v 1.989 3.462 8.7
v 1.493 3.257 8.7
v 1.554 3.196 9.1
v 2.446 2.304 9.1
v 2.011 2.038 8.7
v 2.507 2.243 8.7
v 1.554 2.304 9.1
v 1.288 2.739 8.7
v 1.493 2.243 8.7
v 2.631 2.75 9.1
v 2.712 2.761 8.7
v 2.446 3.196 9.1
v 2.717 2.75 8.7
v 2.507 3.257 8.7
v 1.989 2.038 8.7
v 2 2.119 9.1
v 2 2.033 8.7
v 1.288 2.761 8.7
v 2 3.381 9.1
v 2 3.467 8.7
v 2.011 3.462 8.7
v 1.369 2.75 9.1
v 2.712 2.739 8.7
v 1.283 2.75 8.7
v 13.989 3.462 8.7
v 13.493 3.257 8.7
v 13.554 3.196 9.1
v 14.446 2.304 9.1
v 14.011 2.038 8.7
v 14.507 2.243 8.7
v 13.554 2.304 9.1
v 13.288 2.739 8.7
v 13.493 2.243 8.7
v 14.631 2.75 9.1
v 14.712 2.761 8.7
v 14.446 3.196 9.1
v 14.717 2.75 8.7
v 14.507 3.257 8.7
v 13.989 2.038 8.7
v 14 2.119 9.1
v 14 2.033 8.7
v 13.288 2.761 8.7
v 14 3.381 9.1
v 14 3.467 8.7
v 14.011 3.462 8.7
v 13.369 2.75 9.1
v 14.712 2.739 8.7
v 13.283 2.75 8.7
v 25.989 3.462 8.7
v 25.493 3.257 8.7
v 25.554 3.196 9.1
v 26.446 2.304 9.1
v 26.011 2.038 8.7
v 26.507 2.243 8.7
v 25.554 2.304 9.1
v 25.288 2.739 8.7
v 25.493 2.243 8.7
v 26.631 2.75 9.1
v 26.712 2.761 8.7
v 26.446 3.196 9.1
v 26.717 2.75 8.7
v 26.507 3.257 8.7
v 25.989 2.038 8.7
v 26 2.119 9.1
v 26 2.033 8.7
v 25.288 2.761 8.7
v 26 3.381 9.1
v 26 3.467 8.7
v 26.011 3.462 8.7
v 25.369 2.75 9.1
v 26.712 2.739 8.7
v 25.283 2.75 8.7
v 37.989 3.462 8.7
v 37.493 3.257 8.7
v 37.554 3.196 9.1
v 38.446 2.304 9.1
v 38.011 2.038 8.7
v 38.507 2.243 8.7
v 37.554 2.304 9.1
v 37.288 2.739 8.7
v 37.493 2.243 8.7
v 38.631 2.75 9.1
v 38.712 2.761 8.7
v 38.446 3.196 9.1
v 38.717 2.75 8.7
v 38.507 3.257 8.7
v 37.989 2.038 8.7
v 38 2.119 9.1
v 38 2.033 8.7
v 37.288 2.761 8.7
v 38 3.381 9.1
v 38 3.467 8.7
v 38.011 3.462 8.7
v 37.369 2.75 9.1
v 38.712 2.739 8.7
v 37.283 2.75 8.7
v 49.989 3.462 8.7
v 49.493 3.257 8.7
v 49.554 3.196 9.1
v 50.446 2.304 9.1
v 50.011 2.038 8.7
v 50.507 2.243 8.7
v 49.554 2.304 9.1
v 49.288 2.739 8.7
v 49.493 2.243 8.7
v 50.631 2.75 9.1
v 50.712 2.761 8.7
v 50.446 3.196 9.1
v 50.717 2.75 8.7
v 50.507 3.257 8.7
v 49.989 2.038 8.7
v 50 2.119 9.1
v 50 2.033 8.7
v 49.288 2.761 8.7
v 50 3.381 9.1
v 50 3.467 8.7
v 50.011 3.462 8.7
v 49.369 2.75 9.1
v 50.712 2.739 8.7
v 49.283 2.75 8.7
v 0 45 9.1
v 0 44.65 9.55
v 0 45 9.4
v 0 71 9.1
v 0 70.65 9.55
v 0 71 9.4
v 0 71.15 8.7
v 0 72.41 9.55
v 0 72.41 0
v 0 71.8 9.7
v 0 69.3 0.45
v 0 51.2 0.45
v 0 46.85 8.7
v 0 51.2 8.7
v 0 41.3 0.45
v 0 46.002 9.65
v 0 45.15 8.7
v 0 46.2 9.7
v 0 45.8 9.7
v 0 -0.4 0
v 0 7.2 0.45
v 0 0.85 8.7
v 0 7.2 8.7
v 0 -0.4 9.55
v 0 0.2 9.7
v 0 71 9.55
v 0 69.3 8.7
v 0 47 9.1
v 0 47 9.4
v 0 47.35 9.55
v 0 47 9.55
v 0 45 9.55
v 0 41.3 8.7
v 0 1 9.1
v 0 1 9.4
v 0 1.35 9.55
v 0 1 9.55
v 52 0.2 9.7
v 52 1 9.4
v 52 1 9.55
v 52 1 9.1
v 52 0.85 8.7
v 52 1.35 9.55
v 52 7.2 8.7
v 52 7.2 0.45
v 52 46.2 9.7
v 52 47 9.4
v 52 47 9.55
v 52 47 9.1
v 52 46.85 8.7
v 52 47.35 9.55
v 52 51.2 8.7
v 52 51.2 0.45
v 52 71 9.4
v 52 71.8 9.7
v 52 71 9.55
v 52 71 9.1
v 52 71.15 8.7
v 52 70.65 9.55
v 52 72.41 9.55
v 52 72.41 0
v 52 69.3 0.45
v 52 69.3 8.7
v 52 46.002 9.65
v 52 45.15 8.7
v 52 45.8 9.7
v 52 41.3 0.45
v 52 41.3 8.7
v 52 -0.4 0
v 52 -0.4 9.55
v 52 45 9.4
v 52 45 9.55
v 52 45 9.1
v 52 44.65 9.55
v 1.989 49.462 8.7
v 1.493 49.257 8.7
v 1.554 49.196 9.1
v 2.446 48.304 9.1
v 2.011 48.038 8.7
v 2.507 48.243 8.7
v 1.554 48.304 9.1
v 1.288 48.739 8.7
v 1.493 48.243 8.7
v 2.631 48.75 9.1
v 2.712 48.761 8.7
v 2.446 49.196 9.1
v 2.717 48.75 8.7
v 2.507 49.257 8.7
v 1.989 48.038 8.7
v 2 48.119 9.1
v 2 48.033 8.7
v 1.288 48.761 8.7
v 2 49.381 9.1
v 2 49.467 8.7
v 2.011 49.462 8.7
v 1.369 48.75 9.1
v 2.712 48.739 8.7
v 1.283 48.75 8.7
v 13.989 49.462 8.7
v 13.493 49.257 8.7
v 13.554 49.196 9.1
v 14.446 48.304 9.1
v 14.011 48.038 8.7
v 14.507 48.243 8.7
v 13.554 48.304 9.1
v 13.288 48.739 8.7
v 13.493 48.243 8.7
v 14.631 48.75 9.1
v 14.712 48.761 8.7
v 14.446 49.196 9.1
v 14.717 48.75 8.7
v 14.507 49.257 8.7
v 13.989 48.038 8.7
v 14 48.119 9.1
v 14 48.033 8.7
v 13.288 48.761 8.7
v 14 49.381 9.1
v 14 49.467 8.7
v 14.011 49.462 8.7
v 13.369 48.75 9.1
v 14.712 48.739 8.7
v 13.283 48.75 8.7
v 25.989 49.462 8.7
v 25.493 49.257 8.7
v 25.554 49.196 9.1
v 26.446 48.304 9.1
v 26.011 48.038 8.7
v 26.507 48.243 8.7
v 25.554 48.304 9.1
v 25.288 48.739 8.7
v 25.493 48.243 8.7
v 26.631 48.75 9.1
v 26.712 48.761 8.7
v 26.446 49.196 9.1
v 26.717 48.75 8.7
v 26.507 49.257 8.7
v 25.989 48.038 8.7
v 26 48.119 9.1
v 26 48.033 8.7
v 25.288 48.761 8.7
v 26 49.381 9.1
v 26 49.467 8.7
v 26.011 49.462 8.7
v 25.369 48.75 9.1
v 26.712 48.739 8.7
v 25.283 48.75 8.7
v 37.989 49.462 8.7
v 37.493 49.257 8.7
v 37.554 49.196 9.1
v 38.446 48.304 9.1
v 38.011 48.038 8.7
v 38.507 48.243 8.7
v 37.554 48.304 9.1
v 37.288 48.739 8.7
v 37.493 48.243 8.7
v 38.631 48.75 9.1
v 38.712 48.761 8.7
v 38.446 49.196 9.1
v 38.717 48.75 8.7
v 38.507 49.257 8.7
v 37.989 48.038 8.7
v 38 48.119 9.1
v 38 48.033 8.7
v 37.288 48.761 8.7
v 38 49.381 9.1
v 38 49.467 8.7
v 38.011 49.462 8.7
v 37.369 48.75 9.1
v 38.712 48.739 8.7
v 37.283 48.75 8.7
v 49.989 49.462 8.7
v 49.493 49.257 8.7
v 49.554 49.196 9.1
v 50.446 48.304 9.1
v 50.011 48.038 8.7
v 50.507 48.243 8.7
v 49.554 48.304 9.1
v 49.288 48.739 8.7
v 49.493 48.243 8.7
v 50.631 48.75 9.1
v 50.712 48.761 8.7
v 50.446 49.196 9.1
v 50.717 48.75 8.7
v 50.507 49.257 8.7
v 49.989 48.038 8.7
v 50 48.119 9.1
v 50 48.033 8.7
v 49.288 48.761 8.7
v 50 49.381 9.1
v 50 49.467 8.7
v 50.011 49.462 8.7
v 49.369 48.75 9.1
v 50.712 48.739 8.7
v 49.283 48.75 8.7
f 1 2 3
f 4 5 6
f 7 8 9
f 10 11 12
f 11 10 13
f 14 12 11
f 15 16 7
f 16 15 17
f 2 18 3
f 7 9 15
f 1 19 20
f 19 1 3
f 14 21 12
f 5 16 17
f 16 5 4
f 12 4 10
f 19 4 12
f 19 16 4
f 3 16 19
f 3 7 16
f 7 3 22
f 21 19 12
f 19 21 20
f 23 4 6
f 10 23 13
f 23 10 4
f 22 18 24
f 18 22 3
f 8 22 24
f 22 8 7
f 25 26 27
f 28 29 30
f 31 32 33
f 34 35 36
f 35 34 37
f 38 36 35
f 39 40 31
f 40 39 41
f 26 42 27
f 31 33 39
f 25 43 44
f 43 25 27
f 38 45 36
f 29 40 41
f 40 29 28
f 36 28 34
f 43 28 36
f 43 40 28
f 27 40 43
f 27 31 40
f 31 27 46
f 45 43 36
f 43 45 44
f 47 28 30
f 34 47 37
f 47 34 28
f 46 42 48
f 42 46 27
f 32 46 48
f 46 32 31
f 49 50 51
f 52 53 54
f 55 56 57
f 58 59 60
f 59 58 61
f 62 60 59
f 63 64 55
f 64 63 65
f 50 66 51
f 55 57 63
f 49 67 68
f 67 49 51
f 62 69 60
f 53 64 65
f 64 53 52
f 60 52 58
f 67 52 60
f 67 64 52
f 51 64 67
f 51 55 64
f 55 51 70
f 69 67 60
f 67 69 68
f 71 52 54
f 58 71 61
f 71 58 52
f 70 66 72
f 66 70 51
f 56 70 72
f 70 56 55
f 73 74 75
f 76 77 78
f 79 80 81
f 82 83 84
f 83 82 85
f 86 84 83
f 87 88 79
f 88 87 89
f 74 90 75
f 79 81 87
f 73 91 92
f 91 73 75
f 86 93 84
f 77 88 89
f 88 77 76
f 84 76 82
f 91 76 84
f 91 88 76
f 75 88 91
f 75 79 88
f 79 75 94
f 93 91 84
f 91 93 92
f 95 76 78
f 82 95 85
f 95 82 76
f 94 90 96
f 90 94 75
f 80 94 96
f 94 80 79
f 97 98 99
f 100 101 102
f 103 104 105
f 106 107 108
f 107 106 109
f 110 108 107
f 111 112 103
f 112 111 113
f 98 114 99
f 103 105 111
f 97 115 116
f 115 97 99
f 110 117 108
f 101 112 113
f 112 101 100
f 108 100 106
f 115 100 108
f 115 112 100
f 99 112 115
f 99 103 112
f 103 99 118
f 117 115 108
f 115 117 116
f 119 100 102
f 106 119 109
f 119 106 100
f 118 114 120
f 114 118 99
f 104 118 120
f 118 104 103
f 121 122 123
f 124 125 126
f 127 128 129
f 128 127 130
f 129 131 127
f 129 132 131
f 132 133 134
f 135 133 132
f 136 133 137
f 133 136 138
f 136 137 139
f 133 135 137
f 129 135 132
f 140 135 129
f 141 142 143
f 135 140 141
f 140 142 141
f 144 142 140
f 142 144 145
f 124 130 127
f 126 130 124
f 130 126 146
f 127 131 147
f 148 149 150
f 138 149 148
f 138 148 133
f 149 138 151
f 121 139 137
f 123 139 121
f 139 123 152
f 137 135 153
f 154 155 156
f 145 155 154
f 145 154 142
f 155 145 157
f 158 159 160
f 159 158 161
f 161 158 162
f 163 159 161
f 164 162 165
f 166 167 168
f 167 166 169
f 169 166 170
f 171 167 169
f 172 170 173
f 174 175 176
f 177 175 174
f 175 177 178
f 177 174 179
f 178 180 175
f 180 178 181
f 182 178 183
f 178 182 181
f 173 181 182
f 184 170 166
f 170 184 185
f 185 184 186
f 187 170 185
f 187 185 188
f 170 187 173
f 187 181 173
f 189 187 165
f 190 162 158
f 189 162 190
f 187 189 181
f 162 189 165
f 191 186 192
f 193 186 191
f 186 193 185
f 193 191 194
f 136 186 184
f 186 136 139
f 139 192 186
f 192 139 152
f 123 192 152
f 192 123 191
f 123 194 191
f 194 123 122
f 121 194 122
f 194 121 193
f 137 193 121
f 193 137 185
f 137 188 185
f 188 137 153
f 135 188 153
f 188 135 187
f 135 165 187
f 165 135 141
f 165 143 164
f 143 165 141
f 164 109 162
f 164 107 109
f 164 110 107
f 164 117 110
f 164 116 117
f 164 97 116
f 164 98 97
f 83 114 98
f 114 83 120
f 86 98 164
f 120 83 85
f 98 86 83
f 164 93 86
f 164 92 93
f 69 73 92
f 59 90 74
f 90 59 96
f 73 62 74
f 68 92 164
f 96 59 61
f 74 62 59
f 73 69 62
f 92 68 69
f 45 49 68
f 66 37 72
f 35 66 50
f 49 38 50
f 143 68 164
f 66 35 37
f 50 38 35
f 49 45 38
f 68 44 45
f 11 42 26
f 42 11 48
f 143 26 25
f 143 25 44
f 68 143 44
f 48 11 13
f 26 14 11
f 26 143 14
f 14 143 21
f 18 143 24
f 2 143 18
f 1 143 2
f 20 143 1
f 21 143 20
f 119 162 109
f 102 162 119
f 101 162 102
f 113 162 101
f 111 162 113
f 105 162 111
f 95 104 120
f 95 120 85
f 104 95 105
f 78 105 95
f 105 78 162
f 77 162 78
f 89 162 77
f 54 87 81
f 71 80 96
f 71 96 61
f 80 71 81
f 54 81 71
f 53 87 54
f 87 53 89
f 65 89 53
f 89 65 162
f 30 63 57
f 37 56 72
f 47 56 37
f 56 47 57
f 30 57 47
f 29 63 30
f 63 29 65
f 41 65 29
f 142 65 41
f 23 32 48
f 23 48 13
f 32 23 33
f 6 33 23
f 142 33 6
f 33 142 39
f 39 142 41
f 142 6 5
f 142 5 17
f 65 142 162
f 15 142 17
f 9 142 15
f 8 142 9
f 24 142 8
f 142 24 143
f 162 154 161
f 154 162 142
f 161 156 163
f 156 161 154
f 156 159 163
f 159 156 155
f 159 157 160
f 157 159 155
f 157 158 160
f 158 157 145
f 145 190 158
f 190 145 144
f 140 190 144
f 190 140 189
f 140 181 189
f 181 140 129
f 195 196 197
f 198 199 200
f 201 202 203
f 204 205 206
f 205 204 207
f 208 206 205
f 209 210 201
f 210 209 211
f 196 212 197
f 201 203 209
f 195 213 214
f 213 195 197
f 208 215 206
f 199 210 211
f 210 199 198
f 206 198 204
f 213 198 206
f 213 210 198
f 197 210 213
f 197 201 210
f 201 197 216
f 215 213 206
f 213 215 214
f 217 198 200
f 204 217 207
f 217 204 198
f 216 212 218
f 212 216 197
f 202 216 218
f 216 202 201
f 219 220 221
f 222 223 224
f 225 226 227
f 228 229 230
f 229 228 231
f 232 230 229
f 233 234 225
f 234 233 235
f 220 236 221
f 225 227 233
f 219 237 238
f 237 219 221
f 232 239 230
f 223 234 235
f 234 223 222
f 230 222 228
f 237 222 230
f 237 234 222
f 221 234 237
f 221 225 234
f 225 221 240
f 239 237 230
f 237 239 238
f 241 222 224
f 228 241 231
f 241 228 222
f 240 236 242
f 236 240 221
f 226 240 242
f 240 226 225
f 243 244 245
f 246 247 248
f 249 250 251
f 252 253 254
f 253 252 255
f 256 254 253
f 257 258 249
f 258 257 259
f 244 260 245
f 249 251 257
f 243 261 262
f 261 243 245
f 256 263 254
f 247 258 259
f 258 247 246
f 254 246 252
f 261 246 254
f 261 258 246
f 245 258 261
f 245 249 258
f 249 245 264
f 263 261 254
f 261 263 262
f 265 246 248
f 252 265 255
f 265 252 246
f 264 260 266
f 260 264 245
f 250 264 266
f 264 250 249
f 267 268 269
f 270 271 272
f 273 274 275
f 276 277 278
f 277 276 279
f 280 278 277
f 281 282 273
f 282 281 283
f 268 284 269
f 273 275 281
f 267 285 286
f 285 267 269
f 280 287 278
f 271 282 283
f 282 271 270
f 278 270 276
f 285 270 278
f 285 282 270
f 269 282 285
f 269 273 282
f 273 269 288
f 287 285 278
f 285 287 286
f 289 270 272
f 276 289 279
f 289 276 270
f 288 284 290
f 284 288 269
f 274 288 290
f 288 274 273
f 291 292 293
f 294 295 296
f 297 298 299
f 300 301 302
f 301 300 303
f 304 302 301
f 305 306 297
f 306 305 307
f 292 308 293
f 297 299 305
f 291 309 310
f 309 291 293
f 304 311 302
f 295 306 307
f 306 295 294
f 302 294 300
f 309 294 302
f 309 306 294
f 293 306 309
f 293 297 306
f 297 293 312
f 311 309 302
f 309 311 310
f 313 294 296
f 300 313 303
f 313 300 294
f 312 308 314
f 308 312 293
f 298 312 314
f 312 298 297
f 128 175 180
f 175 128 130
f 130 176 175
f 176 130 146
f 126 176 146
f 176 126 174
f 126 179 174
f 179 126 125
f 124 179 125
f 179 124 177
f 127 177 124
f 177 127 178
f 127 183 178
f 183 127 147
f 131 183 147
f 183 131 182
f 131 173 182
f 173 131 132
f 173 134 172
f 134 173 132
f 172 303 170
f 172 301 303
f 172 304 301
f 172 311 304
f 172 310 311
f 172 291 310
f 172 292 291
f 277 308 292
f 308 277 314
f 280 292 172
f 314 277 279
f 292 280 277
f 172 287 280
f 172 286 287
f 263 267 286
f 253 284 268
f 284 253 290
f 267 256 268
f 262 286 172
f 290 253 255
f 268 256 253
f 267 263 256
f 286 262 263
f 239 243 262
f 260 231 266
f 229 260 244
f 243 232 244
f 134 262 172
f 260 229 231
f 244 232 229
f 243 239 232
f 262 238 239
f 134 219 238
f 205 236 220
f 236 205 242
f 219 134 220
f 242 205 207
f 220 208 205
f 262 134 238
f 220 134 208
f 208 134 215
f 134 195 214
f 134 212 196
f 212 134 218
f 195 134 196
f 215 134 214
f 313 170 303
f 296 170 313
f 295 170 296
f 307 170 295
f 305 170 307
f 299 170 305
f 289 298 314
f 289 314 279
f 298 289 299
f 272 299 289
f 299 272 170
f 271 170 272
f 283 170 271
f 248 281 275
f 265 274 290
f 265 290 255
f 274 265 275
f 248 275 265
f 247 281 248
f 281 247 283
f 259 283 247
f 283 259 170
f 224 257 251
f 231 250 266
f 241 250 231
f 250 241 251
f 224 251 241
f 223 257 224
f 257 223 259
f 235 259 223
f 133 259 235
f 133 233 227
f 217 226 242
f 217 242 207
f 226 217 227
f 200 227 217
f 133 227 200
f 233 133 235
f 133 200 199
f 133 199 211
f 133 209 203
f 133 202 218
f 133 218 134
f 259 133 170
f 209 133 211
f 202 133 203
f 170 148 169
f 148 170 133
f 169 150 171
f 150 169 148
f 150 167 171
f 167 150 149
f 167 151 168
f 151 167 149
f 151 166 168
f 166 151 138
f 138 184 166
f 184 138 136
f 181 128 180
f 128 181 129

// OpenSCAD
/*
 * Copyright (C) 2019 makr@makr.zone
 *
 * This 3D printed feeder is inteded to be used together with the "BlindsFeeder" feeder in OpenPNP. 
 *
 * This file is part of OpenPnP. 
 *
 * OpenPnP is free software: you can redistribute it and/or modify it under the terms of the GNU
 * General Public License as published by the Free Software Foundation, either version 3 of the
 * License, or (at your option) any later version.
 * 
 * OpenPnP is distributed in the hope that it will be useful, but WITHOUT ANY WARRANTY; without even
 * the implied warranty of MERCHANTABILITY or FITNESS FOR A PARTICULAR PURPOSE. See the GNU General
 * Public License for more details.
 * 
 * You should have received a copy of the GNU General Public License along with OpenPnP. If not, see
 * <http://www.gnu.org/licenses/>.
 * 
 * For more information about OpenPnP visit http://openpnp.org
 */

// Include the BlindsFeeder Library. 
// To learn the details about available parameters, please read the extensive comments in the library file. 
// The library also defines some 3D printing constants that you might want to tune along with some advice 
// how to setup your slicer. 
include <BlindsFeeder-Library.scad>

// All dimensions in Millimeters.

// Let's create some tape definitions
// Again, please read the extensive comments in the library file to learn what 
// parameters are avaialable and what exactly they mean and do. 
tape0402 = TapeDefinition(
    tape_width=8,
    tape_thickness=0.5,
    pocket_pitch=2,
    pocket_width=2.25,
    tape_play=-0.03,
    cover_play=0.14);

tape08mm = TapeDefinition(
    tape_width=8,
    tape_thickness=0.4,
    pocket_width=4,
    pocket_portrusion=3,
    tape_play=0.1,
    cover_play=0.15,
    sprocket_thorns=3,
    blinds=false);

tapeSOT3 = TapeDefinition(
    tape_width=8,
    tape_thickness=0.45,
    pocket_portrusion=1.65,
    pocket_pitch=4,
    pocket_width=4,
    tape_play=0.05,
    cover_play=0.1,
    sprocket_thorns=2,
    blinds=false);

tape12mm = TapeDefinition(
    tape_width=12,
    tape_thickness=0.4,
    pocket_portrusion=8.25,
    pocket_pitch=8,
    pocket_width=8.1,
    tape_play=0.1,
    cover_play=0.15,
    sprocket_thorns=3,
    blinds=false);
    
    
tape16mm = TapeDefinition(
    tape_width=16,
    tape_thickness=0.4,
    pocket_portrusion=8.25,
    pocket_pitch=8,
    pocket_width=11.1,
    tape_play=0.1,
    cover_play=0.0,
    sprocket_thorns=3,
    blinds=false);


tape24mm = TapeDefinition(
    tape_width=24,
    tape_thickness=0.4,
    pocket_portrusion=8.25,
    pocket_pitch=8,
    pocket_width=18.1,
    tape_play=0.0,
    cover_play=0.0,
    sprocket_thorns=3,
    blinds=false);

tape32mm = TapeDefinition(
    tape_width=32,
    tape_thickness=0.4,
    pocket_portrusion=8.25,
    pocket_pitch=8,
    pocket_width=26.1,
    tape_play=0.0,
    cover_play=0.0,
    sprocket_thorns=3,
    blinds=false);


tape44mm = TapeDefinition(
    tape_width=44,
    tape_thickness=0.4,
    pocket_portrusion=8.25,
    pocket_pitch=8,
    pocket_width=34.1,
    tape_play=0.0,
    cover_play=0.0,
    sprocket_thorns=3,
    blinds=false);


trayQLPF64 = TapeDefinition(
    tape_width=16,
    tape_thickness=1.6,
    pocket_pitch=16,
    pocket_width=12.1,
    pocket_length=12.1,
    tape_play=0.0,
    cover_play=0.1,
    blinds=false,
    sprocket_thorns=0);


// Create the feeder array with these tape definitions.
// Note the BlindsFeeder has a myriad of parameters you can tweak, the ones used here are just the most important. 
// See the Library file to learn more. 
BlindsFeeder(
    // Tape length from feeder edge to edge, usually multiples of 4mm. 
    // Other values are supported if you manually adjust the edge distance in the OpenPNP feeder.
    tape_length=52,
    flange=false,
        // Underhang of the wall sides. The idea is that the walls are narrowest at the top, 
    // clamping the tape sidewas but also driving it down.
    underhang=0.15,
    // Overhang of walls on top of the tape thickness. Should create a certain tension to snap
    // the tape in and down.
    overhang=0.35,
    // Thickness of the overhang.
    overhang_thickness=layer_height*3,
    cover_slot_thickness=0.000,
    cover_slot_mid=0,
    cover_slot=0,
    cover_thickness=0,
    cover_overhang=0,
    cover_tensions=0,
    cover_vertical_play=0,
    
    // Number of lanes per tape definition.  
    arrayed_tape_lanes=      [1,        0,        1,        0,         0],
    // The arrayed tape definitions.
    arrayed_tapes=           [tape44mm, tape32mm, tape24mm, tape16mm, tape12mm],
    
    debug = false,
    cover = false,
    tray = true
);
